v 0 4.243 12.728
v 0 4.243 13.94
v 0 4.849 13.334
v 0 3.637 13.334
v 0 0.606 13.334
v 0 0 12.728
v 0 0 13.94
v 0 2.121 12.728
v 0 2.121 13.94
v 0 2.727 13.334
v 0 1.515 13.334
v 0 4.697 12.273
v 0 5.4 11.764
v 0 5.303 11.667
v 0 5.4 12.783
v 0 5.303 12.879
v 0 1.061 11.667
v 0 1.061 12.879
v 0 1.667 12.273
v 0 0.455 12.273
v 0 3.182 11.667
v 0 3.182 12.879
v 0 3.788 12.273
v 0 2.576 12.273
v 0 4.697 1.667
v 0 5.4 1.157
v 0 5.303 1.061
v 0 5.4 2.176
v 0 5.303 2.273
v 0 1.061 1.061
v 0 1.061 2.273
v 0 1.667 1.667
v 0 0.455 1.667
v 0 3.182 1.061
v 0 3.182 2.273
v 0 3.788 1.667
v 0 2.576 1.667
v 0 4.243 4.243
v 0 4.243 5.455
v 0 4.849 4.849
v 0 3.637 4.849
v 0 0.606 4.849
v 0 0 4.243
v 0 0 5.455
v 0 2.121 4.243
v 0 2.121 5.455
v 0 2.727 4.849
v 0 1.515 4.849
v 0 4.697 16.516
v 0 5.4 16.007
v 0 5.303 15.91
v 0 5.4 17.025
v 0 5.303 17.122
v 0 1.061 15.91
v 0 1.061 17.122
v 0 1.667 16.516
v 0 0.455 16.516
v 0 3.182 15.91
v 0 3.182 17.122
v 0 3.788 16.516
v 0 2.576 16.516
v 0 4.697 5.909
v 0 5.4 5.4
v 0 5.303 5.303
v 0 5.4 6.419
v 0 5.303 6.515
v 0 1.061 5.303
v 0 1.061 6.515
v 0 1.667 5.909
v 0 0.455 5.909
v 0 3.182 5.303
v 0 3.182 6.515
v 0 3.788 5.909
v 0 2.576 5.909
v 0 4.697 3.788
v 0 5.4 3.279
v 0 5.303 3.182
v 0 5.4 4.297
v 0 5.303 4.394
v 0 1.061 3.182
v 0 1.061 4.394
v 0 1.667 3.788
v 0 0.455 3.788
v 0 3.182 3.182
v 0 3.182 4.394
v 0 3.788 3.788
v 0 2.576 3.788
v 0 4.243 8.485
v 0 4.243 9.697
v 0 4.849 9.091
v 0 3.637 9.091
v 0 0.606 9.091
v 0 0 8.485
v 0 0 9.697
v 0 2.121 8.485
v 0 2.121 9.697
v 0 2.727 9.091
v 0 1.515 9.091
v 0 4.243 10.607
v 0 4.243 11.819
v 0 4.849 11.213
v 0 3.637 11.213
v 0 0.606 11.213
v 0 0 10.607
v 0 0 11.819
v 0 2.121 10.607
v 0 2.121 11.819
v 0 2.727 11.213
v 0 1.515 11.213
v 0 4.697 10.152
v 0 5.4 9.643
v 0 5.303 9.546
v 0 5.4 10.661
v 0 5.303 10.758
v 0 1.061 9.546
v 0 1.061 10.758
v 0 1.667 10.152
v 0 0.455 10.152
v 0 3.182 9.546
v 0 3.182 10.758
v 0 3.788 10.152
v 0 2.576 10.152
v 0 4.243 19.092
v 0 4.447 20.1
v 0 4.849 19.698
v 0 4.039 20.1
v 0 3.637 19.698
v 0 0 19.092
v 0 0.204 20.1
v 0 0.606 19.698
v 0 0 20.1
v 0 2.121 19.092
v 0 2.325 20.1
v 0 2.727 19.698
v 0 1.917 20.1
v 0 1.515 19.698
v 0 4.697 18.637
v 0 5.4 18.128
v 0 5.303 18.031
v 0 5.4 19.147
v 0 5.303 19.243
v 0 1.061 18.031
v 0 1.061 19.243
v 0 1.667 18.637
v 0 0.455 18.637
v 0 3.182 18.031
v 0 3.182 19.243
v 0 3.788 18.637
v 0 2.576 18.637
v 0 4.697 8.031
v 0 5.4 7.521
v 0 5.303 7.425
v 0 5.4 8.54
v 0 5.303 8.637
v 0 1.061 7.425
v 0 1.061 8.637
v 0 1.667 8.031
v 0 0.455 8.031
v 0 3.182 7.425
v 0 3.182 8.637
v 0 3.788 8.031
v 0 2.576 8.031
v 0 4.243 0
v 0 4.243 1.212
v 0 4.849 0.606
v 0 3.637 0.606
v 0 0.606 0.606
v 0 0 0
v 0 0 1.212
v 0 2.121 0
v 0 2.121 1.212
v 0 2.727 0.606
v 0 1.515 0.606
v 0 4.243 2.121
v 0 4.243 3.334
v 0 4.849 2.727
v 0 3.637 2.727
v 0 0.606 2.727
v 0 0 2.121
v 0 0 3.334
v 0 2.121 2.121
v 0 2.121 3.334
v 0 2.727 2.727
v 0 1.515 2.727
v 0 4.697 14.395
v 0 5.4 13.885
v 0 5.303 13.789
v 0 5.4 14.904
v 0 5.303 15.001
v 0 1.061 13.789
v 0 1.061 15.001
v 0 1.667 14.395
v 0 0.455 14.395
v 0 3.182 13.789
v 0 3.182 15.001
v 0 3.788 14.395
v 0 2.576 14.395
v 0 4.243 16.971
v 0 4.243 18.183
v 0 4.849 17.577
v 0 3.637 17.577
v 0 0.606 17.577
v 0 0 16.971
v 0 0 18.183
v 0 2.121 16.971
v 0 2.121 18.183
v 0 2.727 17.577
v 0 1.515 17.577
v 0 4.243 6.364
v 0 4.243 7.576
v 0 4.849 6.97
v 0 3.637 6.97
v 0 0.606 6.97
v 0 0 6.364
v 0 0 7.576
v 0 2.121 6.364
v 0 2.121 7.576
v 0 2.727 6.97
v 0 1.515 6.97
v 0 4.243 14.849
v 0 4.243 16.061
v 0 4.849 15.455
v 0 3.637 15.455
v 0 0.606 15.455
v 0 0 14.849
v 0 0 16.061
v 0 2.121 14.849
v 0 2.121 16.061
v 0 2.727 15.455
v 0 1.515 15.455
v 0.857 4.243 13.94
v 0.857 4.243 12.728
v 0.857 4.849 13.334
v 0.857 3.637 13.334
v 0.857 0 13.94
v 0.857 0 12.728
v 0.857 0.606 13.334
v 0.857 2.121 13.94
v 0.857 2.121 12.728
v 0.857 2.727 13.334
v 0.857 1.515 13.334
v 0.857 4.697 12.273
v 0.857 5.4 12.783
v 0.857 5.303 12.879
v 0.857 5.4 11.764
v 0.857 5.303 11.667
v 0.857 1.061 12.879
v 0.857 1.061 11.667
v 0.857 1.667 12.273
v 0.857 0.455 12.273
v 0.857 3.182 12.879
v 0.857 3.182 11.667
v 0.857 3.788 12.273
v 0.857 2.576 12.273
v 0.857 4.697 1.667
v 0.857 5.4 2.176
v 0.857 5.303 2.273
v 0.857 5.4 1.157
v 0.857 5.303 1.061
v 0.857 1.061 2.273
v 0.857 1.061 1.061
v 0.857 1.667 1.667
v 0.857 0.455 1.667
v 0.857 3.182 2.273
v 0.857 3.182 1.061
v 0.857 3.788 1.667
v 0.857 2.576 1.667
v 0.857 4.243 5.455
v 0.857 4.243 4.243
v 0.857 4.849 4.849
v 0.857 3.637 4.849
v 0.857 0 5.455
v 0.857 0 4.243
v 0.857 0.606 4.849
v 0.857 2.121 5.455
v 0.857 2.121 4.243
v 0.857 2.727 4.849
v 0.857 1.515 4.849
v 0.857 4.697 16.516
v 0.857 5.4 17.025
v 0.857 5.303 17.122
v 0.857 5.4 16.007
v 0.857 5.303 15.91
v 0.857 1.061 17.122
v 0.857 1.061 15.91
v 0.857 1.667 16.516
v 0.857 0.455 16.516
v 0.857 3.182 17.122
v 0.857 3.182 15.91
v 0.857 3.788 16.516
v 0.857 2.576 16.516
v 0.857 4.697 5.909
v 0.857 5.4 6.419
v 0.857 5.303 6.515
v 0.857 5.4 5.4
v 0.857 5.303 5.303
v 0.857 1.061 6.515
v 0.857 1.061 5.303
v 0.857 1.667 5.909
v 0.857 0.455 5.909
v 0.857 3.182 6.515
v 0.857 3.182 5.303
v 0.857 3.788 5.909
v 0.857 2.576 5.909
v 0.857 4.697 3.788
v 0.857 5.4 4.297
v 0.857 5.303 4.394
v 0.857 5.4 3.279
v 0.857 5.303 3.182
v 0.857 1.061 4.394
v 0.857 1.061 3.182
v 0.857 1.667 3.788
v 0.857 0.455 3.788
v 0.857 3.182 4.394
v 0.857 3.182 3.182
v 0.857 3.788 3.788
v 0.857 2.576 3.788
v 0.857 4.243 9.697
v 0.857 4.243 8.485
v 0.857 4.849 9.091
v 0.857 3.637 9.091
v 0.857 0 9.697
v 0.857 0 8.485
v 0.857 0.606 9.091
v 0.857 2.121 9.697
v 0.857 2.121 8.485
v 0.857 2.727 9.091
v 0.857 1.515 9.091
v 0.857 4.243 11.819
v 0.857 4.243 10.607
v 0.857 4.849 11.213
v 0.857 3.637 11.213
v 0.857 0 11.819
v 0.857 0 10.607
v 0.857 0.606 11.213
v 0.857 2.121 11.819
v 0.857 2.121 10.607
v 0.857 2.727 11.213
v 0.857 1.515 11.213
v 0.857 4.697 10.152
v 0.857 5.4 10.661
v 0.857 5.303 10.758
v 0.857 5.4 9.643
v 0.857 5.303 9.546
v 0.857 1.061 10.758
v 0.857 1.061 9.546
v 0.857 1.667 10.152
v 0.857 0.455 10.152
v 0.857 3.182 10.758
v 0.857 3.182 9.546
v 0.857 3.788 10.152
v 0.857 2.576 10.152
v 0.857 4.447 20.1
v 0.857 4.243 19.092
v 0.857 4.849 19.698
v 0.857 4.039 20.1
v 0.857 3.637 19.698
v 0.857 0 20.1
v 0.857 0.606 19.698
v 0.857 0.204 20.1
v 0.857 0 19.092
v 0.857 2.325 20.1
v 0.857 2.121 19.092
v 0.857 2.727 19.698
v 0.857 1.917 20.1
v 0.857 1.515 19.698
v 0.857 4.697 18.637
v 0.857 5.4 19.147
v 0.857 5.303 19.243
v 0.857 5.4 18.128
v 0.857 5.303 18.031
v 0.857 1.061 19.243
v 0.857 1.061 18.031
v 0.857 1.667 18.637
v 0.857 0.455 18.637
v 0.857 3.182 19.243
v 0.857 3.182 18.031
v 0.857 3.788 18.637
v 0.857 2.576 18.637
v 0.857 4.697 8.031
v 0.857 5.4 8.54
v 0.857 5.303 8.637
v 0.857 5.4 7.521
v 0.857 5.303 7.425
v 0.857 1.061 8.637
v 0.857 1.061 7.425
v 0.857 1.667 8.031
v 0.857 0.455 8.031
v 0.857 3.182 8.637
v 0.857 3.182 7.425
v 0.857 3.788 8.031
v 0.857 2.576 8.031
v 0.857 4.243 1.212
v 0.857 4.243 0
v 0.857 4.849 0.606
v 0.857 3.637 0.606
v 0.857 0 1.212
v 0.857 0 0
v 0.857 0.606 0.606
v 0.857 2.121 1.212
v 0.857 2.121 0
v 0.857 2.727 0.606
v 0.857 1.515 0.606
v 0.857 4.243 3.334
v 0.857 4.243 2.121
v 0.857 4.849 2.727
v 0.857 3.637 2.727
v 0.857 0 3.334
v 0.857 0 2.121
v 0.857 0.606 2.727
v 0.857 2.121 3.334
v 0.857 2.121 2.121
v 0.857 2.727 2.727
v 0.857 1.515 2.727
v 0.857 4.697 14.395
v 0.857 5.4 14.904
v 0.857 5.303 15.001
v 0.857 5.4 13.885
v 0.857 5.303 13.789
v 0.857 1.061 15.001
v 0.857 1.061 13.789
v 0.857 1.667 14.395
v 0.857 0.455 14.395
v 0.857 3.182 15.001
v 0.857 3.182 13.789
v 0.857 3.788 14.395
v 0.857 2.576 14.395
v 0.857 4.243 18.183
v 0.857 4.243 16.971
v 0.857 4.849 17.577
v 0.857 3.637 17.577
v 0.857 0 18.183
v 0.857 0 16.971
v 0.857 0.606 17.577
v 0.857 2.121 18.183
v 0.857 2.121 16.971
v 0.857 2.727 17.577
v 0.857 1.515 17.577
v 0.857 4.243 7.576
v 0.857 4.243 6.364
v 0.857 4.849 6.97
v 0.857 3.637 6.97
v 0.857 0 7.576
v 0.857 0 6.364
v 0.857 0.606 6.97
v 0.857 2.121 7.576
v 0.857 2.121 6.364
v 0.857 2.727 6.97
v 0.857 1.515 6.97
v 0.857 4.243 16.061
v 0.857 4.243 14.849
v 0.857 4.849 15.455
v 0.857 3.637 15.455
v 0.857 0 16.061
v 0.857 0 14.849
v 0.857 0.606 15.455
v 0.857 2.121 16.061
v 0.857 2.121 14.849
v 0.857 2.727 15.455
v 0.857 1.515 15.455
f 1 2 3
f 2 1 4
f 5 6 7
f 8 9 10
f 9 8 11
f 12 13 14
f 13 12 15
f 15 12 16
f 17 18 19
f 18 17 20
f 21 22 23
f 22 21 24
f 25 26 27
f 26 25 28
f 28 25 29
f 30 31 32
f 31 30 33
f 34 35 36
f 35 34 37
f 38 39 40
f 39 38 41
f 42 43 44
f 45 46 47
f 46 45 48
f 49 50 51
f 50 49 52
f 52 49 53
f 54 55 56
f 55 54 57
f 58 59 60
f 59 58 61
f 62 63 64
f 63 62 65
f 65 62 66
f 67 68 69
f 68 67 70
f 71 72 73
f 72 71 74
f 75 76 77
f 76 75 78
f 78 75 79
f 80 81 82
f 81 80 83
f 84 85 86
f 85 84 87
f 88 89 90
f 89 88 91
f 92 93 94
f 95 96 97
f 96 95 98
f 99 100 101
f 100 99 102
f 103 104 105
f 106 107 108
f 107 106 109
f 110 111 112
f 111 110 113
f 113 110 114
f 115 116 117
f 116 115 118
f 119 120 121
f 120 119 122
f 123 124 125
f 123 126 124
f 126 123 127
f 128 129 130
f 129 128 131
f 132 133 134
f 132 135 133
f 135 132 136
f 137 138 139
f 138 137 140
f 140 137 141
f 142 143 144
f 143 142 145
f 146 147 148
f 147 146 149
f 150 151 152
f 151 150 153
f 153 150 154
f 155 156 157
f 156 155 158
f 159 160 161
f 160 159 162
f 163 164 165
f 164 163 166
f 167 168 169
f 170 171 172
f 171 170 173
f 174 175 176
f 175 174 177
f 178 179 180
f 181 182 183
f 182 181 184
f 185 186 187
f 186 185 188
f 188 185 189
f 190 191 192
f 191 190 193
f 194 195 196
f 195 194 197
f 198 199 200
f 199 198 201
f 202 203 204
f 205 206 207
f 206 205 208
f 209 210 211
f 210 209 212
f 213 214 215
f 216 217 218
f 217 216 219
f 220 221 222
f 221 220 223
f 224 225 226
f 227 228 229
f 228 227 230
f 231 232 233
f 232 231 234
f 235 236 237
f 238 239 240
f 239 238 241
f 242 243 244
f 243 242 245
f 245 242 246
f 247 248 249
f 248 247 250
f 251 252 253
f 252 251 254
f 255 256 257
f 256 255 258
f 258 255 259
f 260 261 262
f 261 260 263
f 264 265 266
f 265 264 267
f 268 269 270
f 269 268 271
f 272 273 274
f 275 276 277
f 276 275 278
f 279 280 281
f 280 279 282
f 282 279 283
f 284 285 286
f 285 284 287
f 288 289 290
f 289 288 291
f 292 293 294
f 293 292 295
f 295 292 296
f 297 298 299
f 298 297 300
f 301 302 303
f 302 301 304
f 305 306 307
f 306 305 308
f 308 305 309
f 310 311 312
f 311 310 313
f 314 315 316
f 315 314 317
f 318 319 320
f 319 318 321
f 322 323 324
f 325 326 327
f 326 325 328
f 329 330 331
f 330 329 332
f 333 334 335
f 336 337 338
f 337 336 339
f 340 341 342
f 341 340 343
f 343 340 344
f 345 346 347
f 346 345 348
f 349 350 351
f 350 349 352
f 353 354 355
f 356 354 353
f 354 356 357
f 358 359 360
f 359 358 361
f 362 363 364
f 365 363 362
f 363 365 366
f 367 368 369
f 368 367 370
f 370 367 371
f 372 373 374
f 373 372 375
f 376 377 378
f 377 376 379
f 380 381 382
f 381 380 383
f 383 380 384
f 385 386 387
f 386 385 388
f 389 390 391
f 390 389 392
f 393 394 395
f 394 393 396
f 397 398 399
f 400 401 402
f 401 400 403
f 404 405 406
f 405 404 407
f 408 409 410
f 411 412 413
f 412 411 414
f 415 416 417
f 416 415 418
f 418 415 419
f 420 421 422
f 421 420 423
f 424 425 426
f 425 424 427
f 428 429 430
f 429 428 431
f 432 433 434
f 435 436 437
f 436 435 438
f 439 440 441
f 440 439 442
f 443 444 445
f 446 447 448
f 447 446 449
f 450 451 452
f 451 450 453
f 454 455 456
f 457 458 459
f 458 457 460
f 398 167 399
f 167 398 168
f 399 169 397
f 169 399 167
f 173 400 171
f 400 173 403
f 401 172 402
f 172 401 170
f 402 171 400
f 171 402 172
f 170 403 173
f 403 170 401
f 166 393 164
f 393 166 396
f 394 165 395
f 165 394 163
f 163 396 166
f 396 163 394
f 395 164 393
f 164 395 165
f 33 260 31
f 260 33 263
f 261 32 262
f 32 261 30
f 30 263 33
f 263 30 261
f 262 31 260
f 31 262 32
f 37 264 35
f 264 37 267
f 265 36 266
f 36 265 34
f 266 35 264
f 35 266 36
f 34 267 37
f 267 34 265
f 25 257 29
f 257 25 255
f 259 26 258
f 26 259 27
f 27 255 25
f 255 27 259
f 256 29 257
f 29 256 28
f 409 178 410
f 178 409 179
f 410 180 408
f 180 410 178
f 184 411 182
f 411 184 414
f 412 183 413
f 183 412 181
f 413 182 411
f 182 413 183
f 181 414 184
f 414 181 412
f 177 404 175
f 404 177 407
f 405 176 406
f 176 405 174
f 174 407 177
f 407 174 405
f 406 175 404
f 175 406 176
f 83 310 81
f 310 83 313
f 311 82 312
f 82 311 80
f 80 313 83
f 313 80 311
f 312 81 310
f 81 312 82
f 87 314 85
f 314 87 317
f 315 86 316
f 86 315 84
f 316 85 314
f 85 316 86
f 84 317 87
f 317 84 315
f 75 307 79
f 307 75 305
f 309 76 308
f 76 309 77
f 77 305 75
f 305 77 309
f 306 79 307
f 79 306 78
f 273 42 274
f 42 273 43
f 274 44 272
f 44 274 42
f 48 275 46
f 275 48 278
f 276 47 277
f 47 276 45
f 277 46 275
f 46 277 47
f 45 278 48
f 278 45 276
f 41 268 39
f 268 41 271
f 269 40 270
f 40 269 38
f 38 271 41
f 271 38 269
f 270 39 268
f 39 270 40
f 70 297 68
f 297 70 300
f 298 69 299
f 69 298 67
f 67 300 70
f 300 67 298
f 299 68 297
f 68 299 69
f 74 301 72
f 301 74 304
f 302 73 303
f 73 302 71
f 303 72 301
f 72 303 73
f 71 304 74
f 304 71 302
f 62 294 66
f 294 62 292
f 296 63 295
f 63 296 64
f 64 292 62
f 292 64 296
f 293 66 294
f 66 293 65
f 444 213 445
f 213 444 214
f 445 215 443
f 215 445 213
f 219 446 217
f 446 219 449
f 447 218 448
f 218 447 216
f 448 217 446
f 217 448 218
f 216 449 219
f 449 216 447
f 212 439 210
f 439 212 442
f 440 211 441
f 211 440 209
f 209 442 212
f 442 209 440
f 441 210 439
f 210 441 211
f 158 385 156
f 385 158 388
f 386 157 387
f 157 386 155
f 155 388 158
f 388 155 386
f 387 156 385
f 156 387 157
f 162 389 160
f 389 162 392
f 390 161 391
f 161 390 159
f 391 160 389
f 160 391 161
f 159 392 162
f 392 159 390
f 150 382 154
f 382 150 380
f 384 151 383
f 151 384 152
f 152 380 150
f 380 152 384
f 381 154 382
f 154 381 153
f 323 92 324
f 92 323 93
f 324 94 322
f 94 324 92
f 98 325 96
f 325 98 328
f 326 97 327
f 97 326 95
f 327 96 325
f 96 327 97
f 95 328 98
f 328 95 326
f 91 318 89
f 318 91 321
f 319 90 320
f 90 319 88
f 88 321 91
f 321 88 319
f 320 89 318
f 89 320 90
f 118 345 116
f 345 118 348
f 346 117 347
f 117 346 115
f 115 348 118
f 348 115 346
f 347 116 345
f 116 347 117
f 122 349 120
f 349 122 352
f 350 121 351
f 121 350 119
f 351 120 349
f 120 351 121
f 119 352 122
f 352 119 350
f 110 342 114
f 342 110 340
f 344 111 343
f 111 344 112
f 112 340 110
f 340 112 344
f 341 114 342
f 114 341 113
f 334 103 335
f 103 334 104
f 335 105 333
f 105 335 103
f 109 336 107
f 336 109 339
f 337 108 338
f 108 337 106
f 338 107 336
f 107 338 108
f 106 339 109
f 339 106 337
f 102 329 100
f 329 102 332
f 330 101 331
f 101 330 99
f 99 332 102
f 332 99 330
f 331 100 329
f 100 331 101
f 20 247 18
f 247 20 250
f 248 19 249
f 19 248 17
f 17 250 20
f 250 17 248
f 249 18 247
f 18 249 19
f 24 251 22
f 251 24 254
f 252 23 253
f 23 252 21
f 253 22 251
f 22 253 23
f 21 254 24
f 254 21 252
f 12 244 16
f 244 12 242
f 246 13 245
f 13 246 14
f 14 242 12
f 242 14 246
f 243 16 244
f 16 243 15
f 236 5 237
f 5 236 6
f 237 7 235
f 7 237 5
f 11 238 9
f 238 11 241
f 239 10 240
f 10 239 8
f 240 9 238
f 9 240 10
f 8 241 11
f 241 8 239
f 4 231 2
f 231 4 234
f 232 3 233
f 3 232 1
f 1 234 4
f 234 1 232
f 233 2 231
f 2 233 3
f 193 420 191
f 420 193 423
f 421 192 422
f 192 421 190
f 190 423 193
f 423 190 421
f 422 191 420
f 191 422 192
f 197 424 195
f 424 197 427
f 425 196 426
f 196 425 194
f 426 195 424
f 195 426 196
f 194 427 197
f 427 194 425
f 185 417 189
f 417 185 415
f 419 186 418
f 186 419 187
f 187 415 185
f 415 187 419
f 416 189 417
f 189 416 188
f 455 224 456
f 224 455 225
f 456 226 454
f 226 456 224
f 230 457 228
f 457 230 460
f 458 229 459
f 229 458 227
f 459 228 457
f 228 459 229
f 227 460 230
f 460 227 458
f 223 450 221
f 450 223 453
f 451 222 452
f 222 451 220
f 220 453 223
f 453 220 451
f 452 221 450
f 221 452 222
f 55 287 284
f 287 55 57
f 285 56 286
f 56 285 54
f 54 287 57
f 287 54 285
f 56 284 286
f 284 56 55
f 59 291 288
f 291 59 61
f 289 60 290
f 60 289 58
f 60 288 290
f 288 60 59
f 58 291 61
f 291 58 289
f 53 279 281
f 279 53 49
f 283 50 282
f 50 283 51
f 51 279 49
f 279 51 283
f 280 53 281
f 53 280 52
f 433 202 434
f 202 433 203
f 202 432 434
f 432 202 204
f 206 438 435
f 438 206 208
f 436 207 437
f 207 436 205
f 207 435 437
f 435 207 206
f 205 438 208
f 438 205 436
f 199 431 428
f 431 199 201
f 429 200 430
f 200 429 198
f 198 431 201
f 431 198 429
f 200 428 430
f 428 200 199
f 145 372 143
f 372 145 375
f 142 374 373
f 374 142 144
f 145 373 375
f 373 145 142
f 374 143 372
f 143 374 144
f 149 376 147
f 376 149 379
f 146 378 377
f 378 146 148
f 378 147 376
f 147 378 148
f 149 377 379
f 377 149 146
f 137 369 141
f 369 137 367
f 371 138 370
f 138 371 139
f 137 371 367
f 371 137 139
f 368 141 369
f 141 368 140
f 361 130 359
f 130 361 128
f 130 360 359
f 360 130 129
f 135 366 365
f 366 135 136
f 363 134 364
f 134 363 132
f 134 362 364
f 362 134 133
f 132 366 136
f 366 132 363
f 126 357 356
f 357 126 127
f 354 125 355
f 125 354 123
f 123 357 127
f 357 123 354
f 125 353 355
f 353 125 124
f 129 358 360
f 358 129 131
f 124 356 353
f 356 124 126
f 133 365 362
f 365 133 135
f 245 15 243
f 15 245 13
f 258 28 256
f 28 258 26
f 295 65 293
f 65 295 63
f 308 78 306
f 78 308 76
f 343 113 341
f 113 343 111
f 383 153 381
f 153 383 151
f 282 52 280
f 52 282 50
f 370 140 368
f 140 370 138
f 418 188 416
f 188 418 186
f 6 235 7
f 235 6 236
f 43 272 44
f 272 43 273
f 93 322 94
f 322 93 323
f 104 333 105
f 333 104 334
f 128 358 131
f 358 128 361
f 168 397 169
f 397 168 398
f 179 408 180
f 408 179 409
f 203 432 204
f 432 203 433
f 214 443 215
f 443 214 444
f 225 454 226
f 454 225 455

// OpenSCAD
// 2d tiling of objects

module 1d_tile(times = 5, length = -1, direction = [1,0,0], step = 0) {
  l = step <= 0? norm(direction) : step;
  d = direction / norm(direction);
  times_ = length <= 0 ? times : length / l + 1;
  for (i = [0 : times_ - 1]) {
    translate(i * l * d) children();
  }
}

module 2d_tile(times = [5,5], dim = [-1, -1],  offsets = [0], directions = [[1,0,0],[0,1,0]], steps = [0,0]) {
  l = steps[0] <= 0? norm(directions[0]) : steps[0];
  d = directions[0] / norm(directions[0]);
  d2 = directions[1] / norm(directions[1]);
  times_ = dim[0] <= 0 ? times[0] : dim[0] / l + 1;
  for (i = [0 : times_ - 1]) {
    l2 = offsets[i % len(offsets)];
    if (dim[1] - l2 > 0) {
      translate(i * l * d + l2 * d2)
      1d_tile(times = times[1], length = dim[1] - l2, direction = directions[1], step = steps[1]) children();
    }
  }
}

/*
1d_tile(length = 60, direction = 10*[1 + cos(60),sin(60),0])
translate([0,10*sin(60),0])
1d_tile(length = 100, direction = [0,1,0], step = 20 * sin(60))
union() {
  for (a = [-120 : 120 : 120]) {
    rotate([0,0,a])
    translate([-2, -2, 0])
    cube([12,4,4]);
  }
}
*/
s = 3;
dim = [20.1,5.4];
union() {
  intersection() {
  2d_tile(dim = dim, steps = [s/2 * sin(45), s * cos(45)], directions = [[0,0,1],[0,1,0]], offsets = [0,s/2  * cos(45)])
  rotate([45,0,0])
  cube([s*2/7,s*2/7,s*2/7]);
  cube([s*2/7, dim[1], dim[0]]);
  }
}
